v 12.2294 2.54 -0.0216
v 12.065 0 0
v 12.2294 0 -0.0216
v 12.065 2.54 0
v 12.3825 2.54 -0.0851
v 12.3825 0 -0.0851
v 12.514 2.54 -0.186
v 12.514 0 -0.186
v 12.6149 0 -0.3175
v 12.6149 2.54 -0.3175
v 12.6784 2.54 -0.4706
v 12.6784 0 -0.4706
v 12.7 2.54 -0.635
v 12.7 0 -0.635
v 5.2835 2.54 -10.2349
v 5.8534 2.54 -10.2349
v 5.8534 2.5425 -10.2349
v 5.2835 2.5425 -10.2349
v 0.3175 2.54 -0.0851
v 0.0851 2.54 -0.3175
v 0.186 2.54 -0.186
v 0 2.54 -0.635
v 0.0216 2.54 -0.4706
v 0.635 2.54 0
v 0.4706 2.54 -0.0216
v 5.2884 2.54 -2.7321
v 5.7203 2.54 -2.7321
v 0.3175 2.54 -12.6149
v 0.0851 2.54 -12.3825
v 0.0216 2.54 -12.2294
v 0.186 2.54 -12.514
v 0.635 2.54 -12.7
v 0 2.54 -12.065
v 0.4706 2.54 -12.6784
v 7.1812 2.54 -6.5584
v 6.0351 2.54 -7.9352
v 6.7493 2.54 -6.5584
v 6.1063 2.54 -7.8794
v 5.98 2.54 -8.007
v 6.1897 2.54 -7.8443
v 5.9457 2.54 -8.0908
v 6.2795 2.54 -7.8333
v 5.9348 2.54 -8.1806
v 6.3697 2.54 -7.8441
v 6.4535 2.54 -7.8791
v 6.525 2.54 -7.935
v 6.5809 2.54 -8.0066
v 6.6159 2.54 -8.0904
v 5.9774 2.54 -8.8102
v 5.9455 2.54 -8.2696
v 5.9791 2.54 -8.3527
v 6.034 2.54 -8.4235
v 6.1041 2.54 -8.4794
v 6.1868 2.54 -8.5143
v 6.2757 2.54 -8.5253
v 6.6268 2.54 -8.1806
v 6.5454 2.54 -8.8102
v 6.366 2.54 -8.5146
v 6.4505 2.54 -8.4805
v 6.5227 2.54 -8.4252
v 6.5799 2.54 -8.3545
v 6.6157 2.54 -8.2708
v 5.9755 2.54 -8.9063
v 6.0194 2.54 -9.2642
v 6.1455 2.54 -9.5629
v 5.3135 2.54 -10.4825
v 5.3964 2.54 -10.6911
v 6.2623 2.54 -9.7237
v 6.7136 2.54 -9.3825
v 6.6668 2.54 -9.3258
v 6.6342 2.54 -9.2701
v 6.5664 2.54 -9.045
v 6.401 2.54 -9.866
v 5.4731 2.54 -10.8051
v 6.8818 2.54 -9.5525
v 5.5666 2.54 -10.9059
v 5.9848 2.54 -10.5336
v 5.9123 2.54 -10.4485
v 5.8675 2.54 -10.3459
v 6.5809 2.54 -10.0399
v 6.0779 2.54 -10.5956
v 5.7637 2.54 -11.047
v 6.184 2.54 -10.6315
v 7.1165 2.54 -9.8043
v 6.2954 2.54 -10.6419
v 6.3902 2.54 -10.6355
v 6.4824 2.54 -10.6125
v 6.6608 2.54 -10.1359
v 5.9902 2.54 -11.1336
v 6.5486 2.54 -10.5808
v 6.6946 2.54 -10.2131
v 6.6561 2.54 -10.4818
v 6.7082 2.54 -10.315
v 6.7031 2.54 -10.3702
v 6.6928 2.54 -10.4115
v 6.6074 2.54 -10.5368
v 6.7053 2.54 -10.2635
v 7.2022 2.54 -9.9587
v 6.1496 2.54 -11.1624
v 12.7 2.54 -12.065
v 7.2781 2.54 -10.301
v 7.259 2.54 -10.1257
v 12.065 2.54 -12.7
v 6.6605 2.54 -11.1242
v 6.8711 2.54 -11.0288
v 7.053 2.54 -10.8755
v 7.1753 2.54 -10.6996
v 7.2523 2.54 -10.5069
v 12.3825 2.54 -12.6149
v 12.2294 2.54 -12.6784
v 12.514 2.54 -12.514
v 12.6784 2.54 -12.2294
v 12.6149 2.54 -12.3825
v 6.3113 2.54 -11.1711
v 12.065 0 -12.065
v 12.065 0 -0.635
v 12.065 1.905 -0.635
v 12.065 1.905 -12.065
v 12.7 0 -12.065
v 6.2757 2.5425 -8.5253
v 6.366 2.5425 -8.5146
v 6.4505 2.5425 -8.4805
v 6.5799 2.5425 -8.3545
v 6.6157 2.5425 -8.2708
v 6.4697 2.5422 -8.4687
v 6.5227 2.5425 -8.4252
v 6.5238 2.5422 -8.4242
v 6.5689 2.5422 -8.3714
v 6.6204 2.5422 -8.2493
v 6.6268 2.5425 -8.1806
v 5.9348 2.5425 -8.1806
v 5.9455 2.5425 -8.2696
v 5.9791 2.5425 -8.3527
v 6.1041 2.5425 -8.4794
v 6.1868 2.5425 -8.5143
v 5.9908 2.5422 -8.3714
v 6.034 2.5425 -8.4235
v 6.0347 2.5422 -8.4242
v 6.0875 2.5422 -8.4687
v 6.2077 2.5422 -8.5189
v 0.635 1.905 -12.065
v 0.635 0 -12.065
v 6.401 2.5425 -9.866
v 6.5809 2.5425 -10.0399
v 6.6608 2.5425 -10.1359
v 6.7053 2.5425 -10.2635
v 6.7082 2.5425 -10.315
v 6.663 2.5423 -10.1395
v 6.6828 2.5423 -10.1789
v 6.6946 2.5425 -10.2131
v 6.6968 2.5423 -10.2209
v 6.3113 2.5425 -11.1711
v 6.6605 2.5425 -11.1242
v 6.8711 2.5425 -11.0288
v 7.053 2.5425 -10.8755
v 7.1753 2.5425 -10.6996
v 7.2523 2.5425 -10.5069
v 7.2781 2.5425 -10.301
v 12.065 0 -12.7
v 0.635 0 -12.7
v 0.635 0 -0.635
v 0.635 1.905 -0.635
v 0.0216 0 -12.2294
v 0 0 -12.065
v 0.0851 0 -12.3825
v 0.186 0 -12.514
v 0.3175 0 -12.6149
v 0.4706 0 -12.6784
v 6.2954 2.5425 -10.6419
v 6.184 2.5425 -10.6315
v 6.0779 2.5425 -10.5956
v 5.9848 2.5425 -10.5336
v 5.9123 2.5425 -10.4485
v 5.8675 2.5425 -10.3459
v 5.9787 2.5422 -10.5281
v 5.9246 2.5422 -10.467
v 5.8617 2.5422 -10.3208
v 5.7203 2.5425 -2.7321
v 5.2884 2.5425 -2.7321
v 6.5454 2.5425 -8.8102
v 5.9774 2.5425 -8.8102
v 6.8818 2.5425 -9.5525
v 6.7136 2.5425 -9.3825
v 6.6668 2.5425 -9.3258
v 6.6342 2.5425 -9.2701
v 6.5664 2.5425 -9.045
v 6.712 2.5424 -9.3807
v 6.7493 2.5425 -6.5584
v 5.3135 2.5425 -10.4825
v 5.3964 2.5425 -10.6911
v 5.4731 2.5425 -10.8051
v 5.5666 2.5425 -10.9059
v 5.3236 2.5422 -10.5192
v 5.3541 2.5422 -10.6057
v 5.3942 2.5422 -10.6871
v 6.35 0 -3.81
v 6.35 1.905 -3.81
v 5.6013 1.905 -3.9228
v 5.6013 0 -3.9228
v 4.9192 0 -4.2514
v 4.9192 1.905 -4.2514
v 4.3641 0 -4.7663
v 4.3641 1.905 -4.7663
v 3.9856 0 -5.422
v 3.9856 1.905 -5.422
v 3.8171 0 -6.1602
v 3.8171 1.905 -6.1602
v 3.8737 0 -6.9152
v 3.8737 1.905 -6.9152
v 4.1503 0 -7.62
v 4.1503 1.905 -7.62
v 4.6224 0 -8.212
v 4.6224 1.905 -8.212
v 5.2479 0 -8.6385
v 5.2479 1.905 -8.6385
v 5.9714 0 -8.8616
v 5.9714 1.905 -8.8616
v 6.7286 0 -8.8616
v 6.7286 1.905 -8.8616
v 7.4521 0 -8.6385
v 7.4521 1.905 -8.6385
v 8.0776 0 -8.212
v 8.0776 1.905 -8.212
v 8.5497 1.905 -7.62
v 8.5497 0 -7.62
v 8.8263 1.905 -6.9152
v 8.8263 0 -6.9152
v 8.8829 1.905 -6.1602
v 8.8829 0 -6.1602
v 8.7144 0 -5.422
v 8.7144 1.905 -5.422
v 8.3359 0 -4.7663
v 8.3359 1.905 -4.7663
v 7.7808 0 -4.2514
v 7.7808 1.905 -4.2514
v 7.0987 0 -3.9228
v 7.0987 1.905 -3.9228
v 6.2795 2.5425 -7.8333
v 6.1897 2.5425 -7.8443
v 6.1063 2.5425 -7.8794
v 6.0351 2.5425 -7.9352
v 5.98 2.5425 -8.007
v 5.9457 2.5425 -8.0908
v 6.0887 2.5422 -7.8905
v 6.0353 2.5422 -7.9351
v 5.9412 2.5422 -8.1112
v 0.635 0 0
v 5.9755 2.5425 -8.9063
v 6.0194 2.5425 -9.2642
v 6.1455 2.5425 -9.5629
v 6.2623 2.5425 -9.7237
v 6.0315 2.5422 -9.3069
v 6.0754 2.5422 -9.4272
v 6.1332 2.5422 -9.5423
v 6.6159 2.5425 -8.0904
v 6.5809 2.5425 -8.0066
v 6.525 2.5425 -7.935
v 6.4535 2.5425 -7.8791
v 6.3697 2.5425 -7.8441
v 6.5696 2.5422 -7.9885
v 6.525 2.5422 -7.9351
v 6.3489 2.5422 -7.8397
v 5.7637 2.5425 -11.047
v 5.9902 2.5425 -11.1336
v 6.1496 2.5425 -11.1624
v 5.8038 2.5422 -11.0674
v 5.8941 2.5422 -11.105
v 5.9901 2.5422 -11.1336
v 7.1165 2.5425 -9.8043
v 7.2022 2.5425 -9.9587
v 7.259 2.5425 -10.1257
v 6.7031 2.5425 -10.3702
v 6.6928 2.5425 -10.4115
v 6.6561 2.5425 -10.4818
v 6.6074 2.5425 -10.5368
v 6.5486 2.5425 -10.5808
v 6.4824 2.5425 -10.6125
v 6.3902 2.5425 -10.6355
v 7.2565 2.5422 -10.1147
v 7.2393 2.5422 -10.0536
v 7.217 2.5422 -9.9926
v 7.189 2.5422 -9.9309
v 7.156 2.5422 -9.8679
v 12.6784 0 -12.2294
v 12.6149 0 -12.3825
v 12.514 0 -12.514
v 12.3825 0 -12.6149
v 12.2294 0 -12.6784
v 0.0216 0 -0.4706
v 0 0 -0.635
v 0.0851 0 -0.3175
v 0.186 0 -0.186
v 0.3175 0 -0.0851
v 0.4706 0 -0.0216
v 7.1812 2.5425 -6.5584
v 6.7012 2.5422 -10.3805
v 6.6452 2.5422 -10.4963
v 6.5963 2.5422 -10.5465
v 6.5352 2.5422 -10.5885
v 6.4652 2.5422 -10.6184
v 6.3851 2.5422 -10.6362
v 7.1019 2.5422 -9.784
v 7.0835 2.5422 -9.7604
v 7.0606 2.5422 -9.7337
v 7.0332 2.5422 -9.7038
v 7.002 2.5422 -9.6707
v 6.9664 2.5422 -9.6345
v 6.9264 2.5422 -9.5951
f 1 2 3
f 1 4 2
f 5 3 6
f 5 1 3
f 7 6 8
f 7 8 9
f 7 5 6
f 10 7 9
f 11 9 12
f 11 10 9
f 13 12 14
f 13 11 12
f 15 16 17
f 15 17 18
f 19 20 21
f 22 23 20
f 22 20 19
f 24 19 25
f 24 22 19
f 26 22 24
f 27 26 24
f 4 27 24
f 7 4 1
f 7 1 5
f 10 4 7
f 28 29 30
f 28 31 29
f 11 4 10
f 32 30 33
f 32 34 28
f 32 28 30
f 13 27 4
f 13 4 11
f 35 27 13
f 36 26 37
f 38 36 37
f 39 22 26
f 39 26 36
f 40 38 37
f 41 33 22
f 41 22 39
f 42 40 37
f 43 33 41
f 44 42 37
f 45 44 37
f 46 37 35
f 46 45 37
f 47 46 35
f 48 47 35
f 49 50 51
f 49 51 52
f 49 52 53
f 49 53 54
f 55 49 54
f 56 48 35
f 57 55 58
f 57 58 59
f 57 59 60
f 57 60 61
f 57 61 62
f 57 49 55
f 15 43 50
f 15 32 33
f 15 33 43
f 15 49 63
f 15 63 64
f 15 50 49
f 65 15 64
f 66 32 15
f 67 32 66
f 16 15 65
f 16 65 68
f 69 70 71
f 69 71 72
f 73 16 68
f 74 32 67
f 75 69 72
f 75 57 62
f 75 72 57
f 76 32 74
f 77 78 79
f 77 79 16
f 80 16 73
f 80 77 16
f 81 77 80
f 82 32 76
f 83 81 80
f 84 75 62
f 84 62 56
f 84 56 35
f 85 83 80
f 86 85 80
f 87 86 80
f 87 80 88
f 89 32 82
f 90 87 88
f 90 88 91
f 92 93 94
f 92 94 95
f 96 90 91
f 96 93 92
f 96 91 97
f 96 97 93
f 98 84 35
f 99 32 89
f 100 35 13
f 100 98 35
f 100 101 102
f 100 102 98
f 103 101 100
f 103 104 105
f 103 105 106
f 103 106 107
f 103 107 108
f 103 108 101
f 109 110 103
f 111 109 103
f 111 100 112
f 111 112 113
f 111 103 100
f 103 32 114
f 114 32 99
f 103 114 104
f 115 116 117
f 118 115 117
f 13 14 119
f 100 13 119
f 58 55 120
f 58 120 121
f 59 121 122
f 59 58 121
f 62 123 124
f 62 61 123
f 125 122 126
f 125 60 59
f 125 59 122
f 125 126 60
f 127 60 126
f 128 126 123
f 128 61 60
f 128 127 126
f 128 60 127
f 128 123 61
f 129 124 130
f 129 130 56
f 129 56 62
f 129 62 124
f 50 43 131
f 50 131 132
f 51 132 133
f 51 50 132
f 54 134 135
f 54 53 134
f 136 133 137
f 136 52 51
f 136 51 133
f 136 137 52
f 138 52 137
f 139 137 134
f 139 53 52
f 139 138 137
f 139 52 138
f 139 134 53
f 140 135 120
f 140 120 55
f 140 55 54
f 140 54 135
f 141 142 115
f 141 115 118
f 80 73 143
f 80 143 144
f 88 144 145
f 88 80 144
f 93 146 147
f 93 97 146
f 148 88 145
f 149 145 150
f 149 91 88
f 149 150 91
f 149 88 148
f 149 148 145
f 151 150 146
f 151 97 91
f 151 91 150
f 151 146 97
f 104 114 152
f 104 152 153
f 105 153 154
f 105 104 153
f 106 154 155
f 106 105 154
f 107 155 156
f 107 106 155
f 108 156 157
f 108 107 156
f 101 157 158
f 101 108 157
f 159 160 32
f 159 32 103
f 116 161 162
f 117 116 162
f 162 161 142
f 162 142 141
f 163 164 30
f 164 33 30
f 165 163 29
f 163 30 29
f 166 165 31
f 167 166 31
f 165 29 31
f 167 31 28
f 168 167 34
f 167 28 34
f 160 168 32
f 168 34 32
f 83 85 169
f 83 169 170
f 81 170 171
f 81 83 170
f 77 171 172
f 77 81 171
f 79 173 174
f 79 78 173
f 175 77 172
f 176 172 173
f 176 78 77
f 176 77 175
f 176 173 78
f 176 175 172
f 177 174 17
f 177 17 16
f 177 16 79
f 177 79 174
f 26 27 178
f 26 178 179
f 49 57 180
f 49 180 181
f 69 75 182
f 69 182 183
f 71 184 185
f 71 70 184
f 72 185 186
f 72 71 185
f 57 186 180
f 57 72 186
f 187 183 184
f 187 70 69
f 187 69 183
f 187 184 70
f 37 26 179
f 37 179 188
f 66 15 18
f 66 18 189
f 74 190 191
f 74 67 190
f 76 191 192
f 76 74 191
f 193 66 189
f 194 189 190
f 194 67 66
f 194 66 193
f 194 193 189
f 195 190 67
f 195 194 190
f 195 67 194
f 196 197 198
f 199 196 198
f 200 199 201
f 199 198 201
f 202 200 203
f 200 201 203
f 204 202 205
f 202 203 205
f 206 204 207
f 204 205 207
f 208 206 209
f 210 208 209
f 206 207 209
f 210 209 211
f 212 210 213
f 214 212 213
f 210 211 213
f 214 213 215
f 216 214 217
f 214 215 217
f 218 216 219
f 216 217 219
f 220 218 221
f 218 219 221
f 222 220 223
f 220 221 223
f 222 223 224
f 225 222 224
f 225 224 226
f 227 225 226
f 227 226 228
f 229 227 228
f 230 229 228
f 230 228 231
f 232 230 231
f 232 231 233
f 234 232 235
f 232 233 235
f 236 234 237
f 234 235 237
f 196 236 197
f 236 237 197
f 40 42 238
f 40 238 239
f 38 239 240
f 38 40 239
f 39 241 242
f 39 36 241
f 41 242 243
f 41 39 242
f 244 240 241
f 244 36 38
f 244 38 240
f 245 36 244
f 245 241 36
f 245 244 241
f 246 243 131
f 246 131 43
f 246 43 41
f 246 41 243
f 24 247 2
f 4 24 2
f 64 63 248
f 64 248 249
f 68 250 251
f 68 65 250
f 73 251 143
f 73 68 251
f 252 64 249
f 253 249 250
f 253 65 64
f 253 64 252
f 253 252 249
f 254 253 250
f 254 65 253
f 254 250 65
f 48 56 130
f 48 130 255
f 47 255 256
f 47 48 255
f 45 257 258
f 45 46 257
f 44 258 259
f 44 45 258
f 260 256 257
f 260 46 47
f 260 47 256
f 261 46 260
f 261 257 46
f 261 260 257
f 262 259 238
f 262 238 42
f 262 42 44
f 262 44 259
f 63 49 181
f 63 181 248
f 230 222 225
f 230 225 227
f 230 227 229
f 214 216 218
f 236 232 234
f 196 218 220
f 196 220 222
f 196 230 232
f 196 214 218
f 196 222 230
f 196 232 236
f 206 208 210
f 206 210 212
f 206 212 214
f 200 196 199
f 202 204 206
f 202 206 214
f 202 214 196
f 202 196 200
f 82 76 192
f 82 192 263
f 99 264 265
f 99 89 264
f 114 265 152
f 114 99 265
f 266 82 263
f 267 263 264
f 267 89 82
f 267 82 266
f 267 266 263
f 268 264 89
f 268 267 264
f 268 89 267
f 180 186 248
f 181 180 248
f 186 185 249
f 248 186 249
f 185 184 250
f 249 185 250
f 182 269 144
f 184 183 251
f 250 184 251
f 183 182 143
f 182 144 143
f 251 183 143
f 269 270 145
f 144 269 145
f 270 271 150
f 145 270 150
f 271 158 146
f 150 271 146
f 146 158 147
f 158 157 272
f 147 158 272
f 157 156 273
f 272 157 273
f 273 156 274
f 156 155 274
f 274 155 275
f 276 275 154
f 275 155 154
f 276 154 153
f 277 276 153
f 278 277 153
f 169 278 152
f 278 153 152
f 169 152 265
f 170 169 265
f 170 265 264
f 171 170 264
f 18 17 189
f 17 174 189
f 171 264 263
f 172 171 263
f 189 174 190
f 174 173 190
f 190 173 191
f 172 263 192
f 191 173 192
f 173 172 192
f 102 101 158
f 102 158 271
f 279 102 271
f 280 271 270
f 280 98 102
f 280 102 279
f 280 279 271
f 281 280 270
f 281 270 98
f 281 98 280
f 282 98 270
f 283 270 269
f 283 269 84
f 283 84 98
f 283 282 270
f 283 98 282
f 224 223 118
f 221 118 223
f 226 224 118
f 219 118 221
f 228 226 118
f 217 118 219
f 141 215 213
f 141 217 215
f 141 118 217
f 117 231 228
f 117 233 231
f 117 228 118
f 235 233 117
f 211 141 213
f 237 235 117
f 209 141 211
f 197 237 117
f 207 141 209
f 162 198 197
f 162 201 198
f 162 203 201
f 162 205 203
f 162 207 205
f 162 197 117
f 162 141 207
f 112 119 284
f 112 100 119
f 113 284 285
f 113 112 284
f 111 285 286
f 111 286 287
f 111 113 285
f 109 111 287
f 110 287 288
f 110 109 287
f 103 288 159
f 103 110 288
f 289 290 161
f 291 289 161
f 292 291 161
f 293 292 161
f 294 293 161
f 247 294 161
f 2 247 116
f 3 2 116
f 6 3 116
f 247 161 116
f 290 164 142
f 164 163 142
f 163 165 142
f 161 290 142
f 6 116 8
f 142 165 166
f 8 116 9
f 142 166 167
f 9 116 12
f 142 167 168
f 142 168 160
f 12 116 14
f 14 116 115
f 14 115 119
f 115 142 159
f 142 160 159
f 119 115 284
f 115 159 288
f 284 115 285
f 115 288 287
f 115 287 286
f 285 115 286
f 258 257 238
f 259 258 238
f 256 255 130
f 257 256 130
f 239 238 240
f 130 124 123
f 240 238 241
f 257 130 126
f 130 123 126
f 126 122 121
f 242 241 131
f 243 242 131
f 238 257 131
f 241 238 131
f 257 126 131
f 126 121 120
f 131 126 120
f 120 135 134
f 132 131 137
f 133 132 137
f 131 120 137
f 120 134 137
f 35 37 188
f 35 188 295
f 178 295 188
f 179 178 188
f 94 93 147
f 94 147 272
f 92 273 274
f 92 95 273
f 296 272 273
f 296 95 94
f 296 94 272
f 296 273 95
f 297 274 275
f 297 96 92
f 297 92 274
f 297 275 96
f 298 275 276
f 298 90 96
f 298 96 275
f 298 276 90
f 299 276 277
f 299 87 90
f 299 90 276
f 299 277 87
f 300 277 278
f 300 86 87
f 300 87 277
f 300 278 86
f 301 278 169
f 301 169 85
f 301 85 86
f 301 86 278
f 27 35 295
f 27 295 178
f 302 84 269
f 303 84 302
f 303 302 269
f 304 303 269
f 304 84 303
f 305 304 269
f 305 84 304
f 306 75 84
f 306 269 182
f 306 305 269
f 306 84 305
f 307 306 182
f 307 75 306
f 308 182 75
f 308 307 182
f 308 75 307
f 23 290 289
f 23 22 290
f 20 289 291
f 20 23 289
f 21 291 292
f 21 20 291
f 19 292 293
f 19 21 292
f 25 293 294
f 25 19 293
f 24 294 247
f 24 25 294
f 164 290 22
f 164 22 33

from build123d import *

# Parameters (mm, degrees)
SKETCH1_W           = 12.7
SKETCH1_H           = 12.7
BOSS_EXTRUDE1_DEPTH = 2.54
FILLET1_R           = 0.635
SHELL1_START        = 0.635
SHELL1_OUTLINE_W    = 1.905
SHELL1_OUTLINE_H    = 11.43
SHELL1_DEPTH        = 11.43
SKETCH2_R           = 2.54
BOSS_EXTRUDE2_DEPTH = 1.905
BOSS_EXTRUDE3_DEPTH = 0.00254


# Read off the part's stored shape, not the designer's step: Shell1
with BuildPart() as part:
    # Sketch1 → Boss-Extrude1 (new body)
    with BuildSketch(Plane(origin=(0, 0, 0), x_dir=(1, 0, 0), z_dir=(0, 1, 0))):
        with Locations((6.35, 6.35)):
            Rectangle(SKETCH1_W, SKETCH1_H)
    extrude(amount=BOSS_EXTRUDE1_DEPTH)

    # Fillet1
    fillet1_edges = [part.edges().sort_by_distance(p)[0] for p in [
        (0, 1.27, -12.7),
        (12.7, 1.27, -12.7),
        (12.7, 1.27, 0),
        (0, 1.27, 0),
    ]]
    fillet(fillet1_edges, radius=FILLET1_R)

    # Shell1 outline → Shell1 (cut)
    with BuildSketch(Plane.YZ.offset(SHELL1_START)):
        with Locations((0.9525, -6.35)):
            Rectangle(SHELL1_OUTLINE_W, SHELL1_OUTLINE_H)
    extrude(amount=SHELL1_DEPTH, mode=Mode.SUBTRACT)

    # Sketch2 → Boss-Extrude2 (add)
    with BuildSketch(Plane(origin=(0, 1.905, 0), x_dir=(-1, 0, 0), z_dir=(0, -1, 0))):
        with Locations(Location((-6.35, 6.35, 0), (0, 0, 270))):
            Circle(SKETCH2_R)
    extrude(amount=BOSS_EXTRUDE2_DEPTH)

    # Sketch3 → Boss-Extrude3 (add)
    with BuildSketch(Plane(origin=(0, 2.54, 0), x_dir=(1, 0, 0), z_dir=(0, 1, 0))):
        with BuildLine():
            Line((5.853397436, 10.234897436), (5.283525641, 10.234897436))
            add(Edge.make_bspline(
                [(5.283525641, 10.234897436), (5.284353116, 10.268014374), (5.285977943, 10.333042737), (5.299594671, 10.4283349), (5.322170454, 10.519147471), (5.352113733, 10.606188577), (5.393180841, 10.687937495), (5.441181448, 10.76617845), (5.499755897, 10.839002803), (5.544084465, 10.883394842), (5.566553486, 10.905896034)],
                knots=[0, 0, 0, 0, 1.059318936, 2.080076833, 3.072188589, 4.050544838, 5.018331365, 5.993389509, 6.98290034, 8, 8, 8, 8], degree=3))
            add(Edge.make_bspline(
                [(5.566553486, 10.905896034), (5.590433678, 10.927308972), (5.638116529, 10.970065325), (5.718689808, 11.022828021), (5.803504931, 11.06921666), (5.894268619, 11.106972474), (5.990827059, 11.135076524), (6.092587635, 11.156569797), (6.200177048, 11.168294409), (6.273779262, 11.170162374), (6.311330128, 11.171115385)],
                knots=[0, 0, 0, 0, 0.948883556, 1.894686314, 2.844483856, 3.810176973, 4.799693044, 5.819515431, 6.887545887, 8, 8, 8, 8], degree=3))
            add(Edge.make_bspline(
                [(6.311330128, 11.171115385), (6.359120103, 11.169889945), (6.451588454, 11.167518855), (6.584514069, 11.146011833), (6.706975805, 11.112324433), (6.817814436, 11.062735489), (6.918012523, 11.000478686), (7.007887309, 10.926220415), (7.086994083, 10.839200529), (7.15395512, 10.741225072), (7.209386328, 10.636664029), (7.249233878, 10.527377386), (7.273840561, 10.415142851), (7.276663402, 10.339114174), (7.278076923, 10.301043269)],
                knots=[0, 0, 0, 0, 1.182572727, 2.288148342, 3.325075675, 4.319152577, 5.283495877, 6.237943501, 7.196683647, 8.185423483, 9.169287591, 10.119220246, 11.058210795, 12, 12, 12, 12], degree=3))
            add(Edge.make_bspline(
                [(7.278076923, 10.301043269), (7.277544158, 10.280036013), (7.276486473, 10.238330852), (7.269296582, 10.176000543), (7.257269416, 10.114301607), (7.239843882, 10.052905415), (7.217550967, 9.991355497), (7.188970888, 9.929663399), (7.156358228, 9.866252998), (7.13002819, 9.825307022), (7.116528446, 9.804313502)],
                knots=[0, 0, 0, 0, 0.951041345, 1.888077725, 2.83683973, 3.794061122, 4.774862461, 5.797242242, 6.870618167, 8, 8, 8, 8], degree=3))
            add(Edge.make_bspline(
                [(7.116528446, 9.804313502), (7.111705931, 9.797489865), (7.101130556, 9.782526193), (7.082517064, 9.75891757), (7.059541503, 9.732239397), (7.032124964, 9.702588546), (7.000954688, 9.669311823), (6.965245373, 9.633134756), (6.925180303, 9.593688673), (6.896720873, 9.566610908), (6.881837941, 9.552450521)],
                knots=[0, 0, 0, 0, 0.581581733, 1.275360758, 2.091728324, 3.031843472, 4.086285973, 5.265534873, 6.570004409, 8, 8, 8, 8], degree=3))
            add(Edge.make_bspline(
                [(6.881837941, 9.552450521), (6.867823063, 9.538905104), (6.840980246, 9.512961451), (6.802850531, 9.475403757), (6.768477971, 9.441288703), (6.738583417, 9.410113726), (6.712767428, 9.382030868), (6.691628482, 9.356598526), (6.673181109, 9.335190758), (6.655268183, 9.309193967), (6.636134141, 9.27630329), (6.617692661, 9.232315394), (6.598752582, 9.183656029), (6.583064675, 9.127819109), (6.568525728, 9.063850691), (6.558444173, 8.98913819), (6.550158775, 8.903425503), (6.54703617, 8.842461817), (6.545384615, 8.810217949)],
                knots=[0, 0, 0, 0, 1.102030995, 2.110729467, 3.026154581, 3.840042361, 4.552846469, 5.182140586, 5.710117496, 6.149081041, 6.965348744, 7.856273241, 8.842571802, 9.916136751, 11.13180819, 12.549025941, 14.174769928, 16, 16, 16, 16], degree=3))
            Line((6.545384615, 8.810217949), (5.977420873, 8.810217949))
            Line((5.977420873, 8.810217949), (5.975512821, 8.906256611))
            add(Edge.make_bspline(
                [(5.975512821, 8.906256611), (5.976741281, 8.952959078), (5.97915227, 9.04461782), (5.997923184, 9.17890025), (6.028889585, 9.306674594), (6.073183888, 9.428411842), (6.13183631, 9.545115416), (6.206199488, 9.657101789), (6.295918801, 9.765710318), (6.365304252, 9.831931248), (6.401008614, 9.866007212)],
                knots=[0, 0, 0, 0, 1.033439605, 2.028239196, 2.994517618, 3.938676781, 4.889343937, 5.878493955, 6.908315515, 8, 8, 8, 8], degree=3))
            add(Edge.make_bspline(
                [(6.401008614, 9.866007212), (6.418203829, 9.881882491), (6.451045739, 9.912203398), (6.497521564, 9.955831899), (6.538207001, 9.996143513), (6.574021852, 10.032027952), (6.60360938, 10.064736512), (6.629111702, 10.092412527), (6.647857862, 10.117289473), (6.667224093, 10.144496763), (6.683688858, 10.178654576), (6.697823373, 10.221420023), (6.707139354, 10.267146407), (6.707845528, 10.298877478), (6.708205128, 10.315035657)],
                knots=[0, 0, 0, 0, 1.496681724, 2.858579316, 4.076169266, 5.159545538, 6.0998563, 6.897021917, 7.564130093, 8.090631505, 9.030453413, 9.97369198, 10.968158133, 12, 12, 12, 12], degree=3))
            add(Edge.make_bspline(
                [(6.708205128, 10.315035657), (6.706888341, 10.337037285), (6.704281107, 10.380600413), (6.682492098, 10.442939177), (6.645885475, 10.499075222), (6.596763053, 10.549162809), (6.535851582, 10.591103493), (6.464068799, 10.621322106), (6.382800734, 10.639196819), (6.325417451, 10.641004203), (6.295429687, 10.641948718)],
                knots=[0, 0, 0, 0, 0.89686541, 1.775789589, 2.659646804, 3.614799273, 4.623469819, 5.659165238, 6.776709961, 8, 8, 8, 8], degree=3))
            add(Edge.make_bspline(
                [(6.295429687, 10.641948718), (6.264541595, 10.640790498), (6.204905733, 10.638554313), (6.119938634, 10.616043899), (6.04348174, 10.580249645), (5.977164014, 10.530348621), (5.922544381, 10.469360961), (5.883350326, 10.398410103), (5.85768066, 10.319511854), (5.854856732, 10.263725594), (5.853397436, 10.234897436)],
                knots=[0, 0, 0, 0, 1.100648509, 2.125029966, 3.113637804, 4.097598811, 5.068105762, 6.013525516, 6.973467682, 8, 8, 8, 8], degree=3))
        make_face()
        with BuildLine():
            add(Edge.make_bspline(
                [(6.275713141, 8.525282051), (6.299179014, 8.524134389), (6.345232632, 8.521882012), (6.411126908, 8.501852518), (6.471995891, 8.470197401), (6.524870844, 8.425537098), (6.570385609, 8.37347305), (6.603443799, 8.313958987), (6.623341923, 8.248804438), (6.62562935, 8.203595823), (6.626794872, 8.180560497)],
                knots=[0, 0, 0, 0, 1.02832881, 2.018176019, 2.996839149, 4.02200224, 5.038888337, 6.018215493, 6.990213417, 8, 8, 8, 8], degree=3))
            add(Edge.make_bspline(
                [(6.626794872, 8.180560497), (6.625666727, 8.157301936), (6.623462536, 8.11185888), (6.603201866, 8.046543983), (6.571118549, 7.986459509), (6.526395492, 7.933679904), (6.473728692, 7.88919342), (6.413890891, 7.85658064), (6.348398585, 7.836741414), (6.302775693, 7.834458232), (6.279529247, 7.833294872)],
                knots=[0, 0, 0, 0, 1.020984004, 1.994819617, 2.979715589, 3.999633825, 5.019552061, 5.996242457, 6.979015996, 8, 8, 8, 8], degree=3))
            add(Edge.make_bspline(
                [(6.279529247, 7.833294872), (6.25649052, 7.834451139), (6.211275231, 7.836720402), (6.14626792, 7.856720874), (6.086621496, 7.889203344), (6.03394775, 7.933503713), (5.989781247, 7.986503553), (5.958510337, 8.046704841), (5.938103298, 8.111841812), (5.935923402, 8.157296158), (5.934807692, 8.180560497)],
                knots=[0, 0, 0, 0, 1.015319757, 1.992643789, 2.97283283, 3.99640456, 5.014008891, 5.998034653, 6.975358685, 8, 8, 8, 8], degree=3))
            add(Edge.make_bspline(
                [(5.934807692, 8.180560497), (5.93601664, 8.203587923), (5.938386138, 8.248720962), (5.957566002, 8.313737697), (5.989195997, 8.373406988), (6.033493364, 8.425503873), (6.085003898, 8.469937879), (6.144023925, 8.50185823), (6.208070436, 8.521877137), (6.252880831, 8.524132747), (6.275713141, 8.525282051)],
                knots=[0, 0, 0, 0, 1.024777805, 2.008532629, 2.993375778, 4.013176149, 5.039042267, 6.007247738, 6.984629846, 8, 8, 8, 8], degree=3))
        make_face()
        Polygon((5.288410256, 2.732128205), (6.749342748, 6.558410256), (7.181198718, 6.558410256), (5.720266226, 2.732128205), align=None)
    extrude(amount=BOSS_EXTRUDE3_DEPTH)


solid = part.part
